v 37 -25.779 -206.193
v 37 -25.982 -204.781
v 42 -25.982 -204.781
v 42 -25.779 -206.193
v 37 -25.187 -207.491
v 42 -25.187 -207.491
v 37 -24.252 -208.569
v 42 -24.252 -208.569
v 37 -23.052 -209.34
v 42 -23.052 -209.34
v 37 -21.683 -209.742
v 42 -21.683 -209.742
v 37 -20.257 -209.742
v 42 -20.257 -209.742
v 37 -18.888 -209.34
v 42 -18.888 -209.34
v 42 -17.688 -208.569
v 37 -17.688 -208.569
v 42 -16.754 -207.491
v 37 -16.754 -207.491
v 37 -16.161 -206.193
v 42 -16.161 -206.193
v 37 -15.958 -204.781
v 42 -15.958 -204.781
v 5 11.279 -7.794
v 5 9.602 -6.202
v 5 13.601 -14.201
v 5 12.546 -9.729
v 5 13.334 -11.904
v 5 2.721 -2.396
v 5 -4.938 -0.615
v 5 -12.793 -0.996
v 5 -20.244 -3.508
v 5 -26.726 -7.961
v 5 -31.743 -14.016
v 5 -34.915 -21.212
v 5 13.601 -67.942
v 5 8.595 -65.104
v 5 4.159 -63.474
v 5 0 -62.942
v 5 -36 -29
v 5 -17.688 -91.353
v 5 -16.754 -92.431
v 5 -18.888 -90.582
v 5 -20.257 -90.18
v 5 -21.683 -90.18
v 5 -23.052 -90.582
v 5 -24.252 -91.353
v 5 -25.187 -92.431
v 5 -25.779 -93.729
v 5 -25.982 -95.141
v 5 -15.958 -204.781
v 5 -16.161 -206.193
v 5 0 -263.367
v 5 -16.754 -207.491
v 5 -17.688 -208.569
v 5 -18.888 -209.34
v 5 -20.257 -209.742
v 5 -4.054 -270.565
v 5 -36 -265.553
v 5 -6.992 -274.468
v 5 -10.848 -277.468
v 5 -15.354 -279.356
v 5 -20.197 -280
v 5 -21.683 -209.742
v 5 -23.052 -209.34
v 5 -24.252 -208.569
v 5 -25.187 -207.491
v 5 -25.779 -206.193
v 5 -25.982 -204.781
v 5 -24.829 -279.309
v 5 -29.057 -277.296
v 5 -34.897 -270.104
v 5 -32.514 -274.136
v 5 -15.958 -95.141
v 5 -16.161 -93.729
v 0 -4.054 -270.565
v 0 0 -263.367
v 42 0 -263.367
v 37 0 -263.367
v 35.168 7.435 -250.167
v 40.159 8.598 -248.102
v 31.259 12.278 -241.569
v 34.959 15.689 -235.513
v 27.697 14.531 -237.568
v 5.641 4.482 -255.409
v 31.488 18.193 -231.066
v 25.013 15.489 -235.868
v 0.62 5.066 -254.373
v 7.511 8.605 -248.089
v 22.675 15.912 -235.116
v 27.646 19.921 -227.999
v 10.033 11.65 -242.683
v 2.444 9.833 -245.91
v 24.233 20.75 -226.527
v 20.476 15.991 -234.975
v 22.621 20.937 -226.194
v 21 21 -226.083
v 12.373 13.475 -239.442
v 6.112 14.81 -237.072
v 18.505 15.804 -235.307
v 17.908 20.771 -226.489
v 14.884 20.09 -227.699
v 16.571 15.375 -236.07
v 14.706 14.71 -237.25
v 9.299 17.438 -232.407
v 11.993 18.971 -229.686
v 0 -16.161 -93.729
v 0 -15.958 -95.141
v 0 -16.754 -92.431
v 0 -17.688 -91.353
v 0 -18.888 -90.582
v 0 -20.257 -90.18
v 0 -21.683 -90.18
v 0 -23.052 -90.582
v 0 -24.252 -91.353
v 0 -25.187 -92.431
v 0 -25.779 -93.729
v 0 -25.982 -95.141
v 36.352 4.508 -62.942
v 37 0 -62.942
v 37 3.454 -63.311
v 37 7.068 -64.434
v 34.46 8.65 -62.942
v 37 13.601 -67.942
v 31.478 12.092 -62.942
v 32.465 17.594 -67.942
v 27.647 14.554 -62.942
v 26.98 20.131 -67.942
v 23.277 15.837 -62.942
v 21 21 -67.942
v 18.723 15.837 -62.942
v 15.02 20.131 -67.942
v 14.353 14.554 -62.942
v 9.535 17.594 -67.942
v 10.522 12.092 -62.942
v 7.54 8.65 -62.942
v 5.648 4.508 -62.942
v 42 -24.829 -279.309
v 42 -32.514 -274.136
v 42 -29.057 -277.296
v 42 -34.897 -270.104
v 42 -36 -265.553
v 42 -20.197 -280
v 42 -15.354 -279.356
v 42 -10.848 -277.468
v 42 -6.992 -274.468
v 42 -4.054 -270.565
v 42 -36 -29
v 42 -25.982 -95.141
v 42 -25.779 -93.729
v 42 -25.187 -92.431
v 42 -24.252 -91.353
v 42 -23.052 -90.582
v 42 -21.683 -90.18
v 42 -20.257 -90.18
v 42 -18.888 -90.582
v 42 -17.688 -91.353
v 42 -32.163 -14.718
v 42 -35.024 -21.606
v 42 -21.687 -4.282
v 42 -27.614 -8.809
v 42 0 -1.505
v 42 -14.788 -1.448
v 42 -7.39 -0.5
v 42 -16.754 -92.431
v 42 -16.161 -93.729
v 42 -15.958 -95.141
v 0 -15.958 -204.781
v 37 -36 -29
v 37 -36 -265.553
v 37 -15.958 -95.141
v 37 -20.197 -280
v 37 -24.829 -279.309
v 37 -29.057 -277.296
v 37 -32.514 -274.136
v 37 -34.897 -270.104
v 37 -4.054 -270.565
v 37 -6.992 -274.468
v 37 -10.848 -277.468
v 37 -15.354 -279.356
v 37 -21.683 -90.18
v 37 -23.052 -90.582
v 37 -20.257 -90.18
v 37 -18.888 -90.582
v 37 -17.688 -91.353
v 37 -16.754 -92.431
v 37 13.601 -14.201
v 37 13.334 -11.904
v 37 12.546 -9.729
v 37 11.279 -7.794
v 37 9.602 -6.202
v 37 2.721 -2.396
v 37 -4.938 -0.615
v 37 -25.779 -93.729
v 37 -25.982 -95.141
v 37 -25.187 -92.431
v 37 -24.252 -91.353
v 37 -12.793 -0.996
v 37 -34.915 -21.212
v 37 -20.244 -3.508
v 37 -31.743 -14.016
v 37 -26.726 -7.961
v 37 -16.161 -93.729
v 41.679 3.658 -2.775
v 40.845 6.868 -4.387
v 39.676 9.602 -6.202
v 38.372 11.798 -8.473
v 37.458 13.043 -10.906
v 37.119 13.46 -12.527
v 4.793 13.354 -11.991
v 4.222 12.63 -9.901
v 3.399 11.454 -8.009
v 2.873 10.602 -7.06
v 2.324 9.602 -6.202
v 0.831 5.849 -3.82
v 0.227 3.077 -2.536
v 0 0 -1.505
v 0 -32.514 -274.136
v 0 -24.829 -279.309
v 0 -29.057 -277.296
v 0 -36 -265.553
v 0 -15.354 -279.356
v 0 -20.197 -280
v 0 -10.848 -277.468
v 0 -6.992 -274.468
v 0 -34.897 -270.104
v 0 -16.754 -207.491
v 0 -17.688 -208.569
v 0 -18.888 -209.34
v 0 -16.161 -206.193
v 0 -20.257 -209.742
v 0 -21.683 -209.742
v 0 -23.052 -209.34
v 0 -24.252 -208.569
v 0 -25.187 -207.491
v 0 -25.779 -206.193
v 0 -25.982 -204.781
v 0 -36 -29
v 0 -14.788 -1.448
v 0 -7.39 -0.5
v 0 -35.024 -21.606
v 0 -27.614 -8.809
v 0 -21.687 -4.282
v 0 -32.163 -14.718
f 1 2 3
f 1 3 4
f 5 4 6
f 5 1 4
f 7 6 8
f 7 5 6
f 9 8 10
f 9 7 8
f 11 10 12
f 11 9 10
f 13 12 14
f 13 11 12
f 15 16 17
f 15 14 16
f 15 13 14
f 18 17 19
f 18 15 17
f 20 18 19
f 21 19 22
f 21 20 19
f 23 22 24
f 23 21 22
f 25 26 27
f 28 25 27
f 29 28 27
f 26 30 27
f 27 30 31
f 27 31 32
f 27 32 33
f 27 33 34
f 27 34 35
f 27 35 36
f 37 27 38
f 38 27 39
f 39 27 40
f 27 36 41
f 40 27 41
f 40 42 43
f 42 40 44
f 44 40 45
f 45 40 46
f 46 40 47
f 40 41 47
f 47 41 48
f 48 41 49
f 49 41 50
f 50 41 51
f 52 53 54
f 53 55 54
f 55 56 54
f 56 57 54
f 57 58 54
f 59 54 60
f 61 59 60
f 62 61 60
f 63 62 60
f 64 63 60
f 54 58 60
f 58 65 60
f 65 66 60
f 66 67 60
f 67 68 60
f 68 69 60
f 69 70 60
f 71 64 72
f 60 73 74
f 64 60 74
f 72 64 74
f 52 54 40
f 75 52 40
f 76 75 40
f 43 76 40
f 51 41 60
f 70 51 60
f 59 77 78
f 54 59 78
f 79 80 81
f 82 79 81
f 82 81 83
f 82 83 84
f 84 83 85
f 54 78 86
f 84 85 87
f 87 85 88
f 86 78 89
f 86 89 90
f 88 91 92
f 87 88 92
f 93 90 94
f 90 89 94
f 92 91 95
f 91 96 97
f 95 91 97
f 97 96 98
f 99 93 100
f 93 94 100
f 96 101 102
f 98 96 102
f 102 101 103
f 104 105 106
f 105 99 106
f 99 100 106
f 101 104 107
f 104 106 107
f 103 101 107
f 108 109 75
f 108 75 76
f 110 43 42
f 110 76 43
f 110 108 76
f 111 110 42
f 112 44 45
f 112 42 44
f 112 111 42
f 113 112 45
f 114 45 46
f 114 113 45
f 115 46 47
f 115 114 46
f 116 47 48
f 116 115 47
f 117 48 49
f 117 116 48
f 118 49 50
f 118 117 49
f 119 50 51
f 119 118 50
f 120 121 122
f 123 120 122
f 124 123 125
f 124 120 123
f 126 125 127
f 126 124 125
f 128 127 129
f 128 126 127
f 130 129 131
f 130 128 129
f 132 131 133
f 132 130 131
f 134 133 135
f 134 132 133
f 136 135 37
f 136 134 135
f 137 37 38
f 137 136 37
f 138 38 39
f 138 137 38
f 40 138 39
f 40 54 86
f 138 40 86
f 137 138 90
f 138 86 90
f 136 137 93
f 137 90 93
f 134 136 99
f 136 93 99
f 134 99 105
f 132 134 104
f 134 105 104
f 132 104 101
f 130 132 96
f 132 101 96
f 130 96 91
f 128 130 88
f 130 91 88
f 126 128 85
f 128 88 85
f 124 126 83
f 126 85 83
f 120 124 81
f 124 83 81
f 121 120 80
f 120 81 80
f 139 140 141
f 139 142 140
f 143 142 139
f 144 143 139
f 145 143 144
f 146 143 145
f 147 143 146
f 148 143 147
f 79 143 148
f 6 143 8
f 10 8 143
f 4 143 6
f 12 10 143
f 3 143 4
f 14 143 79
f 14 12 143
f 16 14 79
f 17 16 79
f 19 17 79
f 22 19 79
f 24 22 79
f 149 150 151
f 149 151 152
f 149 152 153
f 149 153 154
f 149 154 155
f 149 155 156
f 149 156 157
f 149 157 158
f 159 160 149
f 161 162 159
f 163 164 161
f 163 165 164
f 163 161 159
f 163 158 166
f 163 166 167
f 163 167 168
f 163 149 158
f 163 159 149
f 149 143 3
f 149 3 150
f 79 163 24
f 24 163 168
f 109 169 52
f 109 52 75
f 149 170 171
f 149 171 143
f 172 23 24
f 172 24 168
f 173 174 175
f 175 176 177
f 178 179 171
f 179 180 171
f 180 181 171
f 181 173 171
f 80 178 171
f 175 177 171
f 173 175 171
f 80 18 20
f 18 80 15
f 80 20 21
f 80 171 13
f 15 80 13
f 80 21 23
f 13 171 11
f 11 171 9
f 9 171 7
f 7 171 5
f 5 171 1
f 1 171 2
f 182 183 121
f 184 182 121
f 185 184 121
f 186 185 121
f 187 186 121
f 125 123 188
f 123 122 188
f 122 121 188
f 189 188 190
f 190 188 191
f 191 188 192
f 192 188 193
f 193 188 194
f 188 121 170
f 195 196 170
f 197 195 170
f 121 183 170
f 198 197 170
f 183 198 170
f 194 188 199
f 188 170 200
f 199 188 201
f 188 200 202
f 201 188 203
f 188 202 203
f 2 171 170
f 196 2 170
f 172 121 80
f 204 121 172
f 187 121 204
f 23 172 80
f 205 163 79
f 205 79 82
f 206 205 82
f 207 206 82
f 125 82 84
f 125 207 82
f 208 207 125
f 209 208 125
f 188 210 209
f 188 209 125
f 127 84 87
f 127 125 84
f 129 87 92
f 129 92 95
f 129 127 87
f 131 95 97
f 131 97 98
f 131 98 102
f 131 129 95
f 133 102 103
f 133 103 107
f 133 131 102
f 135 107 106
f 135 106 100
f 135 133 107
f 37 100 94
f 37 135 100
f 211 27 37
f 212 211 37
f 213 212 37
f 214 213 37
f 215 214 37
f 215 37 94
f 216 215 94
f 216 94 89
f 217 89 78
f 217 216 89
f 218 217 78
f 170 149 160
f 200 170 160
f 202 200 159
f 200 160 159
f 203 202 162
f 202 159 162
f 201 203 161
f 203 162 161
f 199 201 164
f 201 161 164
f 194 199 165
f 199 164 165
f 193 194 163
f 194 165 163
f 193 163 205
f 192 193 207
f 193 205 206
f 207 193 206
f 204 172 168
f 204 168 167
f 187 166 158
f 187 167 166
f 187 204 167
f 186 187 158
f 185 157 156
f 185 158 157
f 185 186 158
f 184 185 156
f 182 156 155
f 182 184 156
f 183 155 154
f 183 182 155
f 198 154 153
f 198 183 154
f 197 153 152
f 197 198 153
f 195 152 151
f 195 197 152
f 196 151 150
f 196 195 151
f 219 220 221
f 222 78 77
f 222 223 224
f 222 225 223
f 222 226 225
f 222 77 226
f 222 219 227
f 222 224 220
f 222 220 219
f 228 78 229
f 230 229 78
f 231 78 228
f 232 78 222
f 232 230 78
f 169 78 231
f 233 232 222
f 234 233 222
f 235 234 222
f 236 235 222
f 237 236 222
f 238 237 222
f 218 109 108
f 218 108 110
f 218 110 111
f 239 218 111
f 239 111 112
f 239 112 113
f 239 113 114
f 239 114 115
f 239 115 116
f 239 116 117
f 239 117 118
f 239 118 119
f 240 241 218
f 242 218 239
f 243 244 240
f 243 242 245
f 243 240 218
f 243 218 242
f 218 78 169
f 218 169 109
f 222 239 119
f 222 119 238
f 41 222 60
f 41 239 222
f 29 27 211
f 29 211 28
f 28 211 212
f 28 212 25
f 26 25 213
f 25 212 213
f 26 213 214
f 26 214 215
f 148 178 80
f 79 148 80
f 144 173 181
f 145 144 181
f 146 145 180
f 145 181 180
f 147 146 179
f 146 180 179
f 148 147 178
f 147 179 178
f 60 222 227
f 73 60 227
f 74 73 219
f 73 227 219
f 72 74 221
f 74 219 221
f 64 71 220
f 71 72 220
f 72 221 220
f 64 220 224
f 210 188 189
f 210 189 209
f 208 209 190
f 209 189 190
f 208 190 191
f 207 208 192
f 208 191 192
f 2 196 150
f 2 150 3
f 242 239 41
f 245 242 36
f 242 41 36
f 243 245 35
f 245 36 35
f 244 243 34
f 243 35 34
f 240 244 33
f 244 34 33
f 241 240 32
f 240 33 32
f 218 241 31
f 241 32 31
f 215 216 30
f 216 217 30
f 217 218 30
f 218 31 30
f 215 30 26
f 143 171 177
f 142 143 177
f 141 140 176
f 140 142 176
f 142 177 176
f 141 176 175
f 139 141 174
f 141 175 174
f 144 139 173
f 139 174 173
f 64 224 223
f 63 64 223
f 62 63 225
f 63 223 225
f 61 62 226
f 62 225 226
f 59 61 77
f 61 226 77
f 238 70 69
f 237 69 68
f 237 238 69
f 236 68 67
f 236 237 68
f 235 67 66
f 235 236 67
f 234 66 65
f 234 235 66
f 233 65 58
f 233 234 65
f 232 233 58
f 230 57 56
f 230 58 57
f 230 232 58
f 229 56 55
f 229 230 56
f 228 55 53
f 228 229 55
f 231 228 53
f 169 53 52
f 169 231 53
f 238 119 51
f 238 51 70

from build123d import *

# Parameters (mm, degrees)
WHOLEBODY_DEPTH    = 280
UPPERCURVE_DEPTH   = 286.41198293
SKETCH6_W          = 32
SKETCH6_H          = 5
CUT_EXTRUDE5_DEPTH = 285.921480537
CUT_EXTRUDE6_DEPTH = 286.411983055
UPPERHOLE_DEPTH    = 289.81308838
CHAMFER1_SIZE      = 10
CUT_EXTRUDE8_DEPTH = 286.411982957
CUT_EXTRUDE9_DEPTH = 286.411982957


with BuildPart() as part:
    # Sketch1 → WholeBody (new body)
    with BuildSketch(Plane.XY):
        with BuildLine():
            Line((0, 0), (0, -36))
            Line((0, -36), (42, -36))
            Line((42, -36), (42, 0))
            ThreePointArc((42, 0), (21, 21), (0, 0))
        make_face()
    extrude(amount=-WHOLEBODY_DEPTH)

    # Sketch2 → UpperCurve (cut, through all)
    with BuildSketch(Plane(origin=(42, 0, 0), x_dir=(0, 0, -1), z_dir=(1, 0, 0))):
        with BuildLine():
            ThreePointArc((29, -36), (0.5, -7.5), (29, 21))
            Line((29, 21), (0, 21))
            Line((0, 21), (0, 0))
            Line((0, 0), (0, -36))
            Line((0, -36), (29, -36))
        make_face()
    extrude(amount=-UPPERCURVE_DEPTH, mode=Mode.SUBTRACT)

    # Sketch6 → Cut-Extrude5 (cut, through all)
    with BuildSketch(Plane(origin=(0, 0, -280), x_dir=(-1, 0, 0), z_dir=(0, 0, -1))):
        with BuildLine():
            Line((-37, 0), (-37, -31))
            Line((-37, -31), (-5, -31))
            Line((-5, -31), (-5, 0))
            ThreePointArc((-5, 0), (-21, 16), (-37, 0))
        make_face()
        with Locations((-21, -33.5)):
            Rectangle(SKETCH6_W, SKETCH6_H)
    extrude(amount=-CUT_EXTRUDE5_DEPTH, mode=Mode.SUBTRACT)

    # Sketch8 → Cut-Extrude6 (cut, through all)
    with BuildSketch(Plane.ZY):
        Polygon((-263.367084443, 0), (-226.082527774, 21), (-280, 21), (-280, 0), align=None)
        with BuildLine():
            Line((-270.565078665, -4.054168593), (-263.367084443, 0))
            Line((-263.367084443, 0), (-280, 0))
            Line((-280, 0), (-280, -20.196793601))
            ThreePointArc((-280, -20.196793601), (-277.468291323, -10.847969039), (-270.565078665, -4.054168593))
        make_face()
        with BuildLine():
            ThreePointArc((-265.552960254, -36), (-275.843932749, -30.902613162), (-280, -20.196793601))
            Line((-280, -20.196793601), (-280, -36))
            Line((-280, -36), (-265.552960254, -36))
        make_face()
    extrude(amount=-CUT_EXTRUDE6_DEPTH, mode=Mode.SUBTRACT)

    # Sketch9 → UpperHole (cut, through all)
    with BuildSketch(Plane.XZ.offset(36)):
        Polygon((5, -0.5), (5, -57.942137899), (37, -57.942137899), (37, -29), (37, 4.098042087), (5, 4.098042087), align=None)
    extrude(amount=-UPPERHOLE_DEPTH, mode=Mode.SUBTRACT)

    # Chamfer1
    # the kernel refuses this chamfer: 10 mm, written as the material it takes off along each edge
    with BuildSketch(Plane(origin=(21, 0, -57.942137899), x_dir=(0.86749005683434, -0.49745452183446237, 0), z_dir=(-0.49745452183446237, -0.86749005683434, 0))) as chamfer1_piece_1_section:
        Polygon((21, -CHAMFER1_SIZE), (21 - CHAMFER1_SIZE, 0), (21, 0), align=None)
    chamfer1_piece_1 = revolve(axis=Axis((21, 0, -57.942137899), (0, 0, 1)), revolution_arc=239.663469858, mode=Mode.PRIVATE)
    chamfer1_piece_1 = split(chamfer1_piece_1, bisect_by=Plane(origin=(5, 16.096053983, -62.846083916), z_dir=(1, 0, 0)), keep=Keep.TOP, mode=Mode.PRIVATE)
    chamfer1_piece_1 = split(chamfer1_piece_1, bisect_by=Plane(origin=(37, 16.096053983, -62.846083916), z_dir=(-1, 0, 0)), keep=Keep.TOP, mode=Mode.PRIVATE)
    add(chamfer1_piece_1, mode=Mode.SUBTRACT)

    # Sketch11 → Cut-Extrude8 (cut, through all)
    with BuildSketch(Plane.ZY):
        with BuildLine():
            Line((-9.843331647, 13.601470509), (-14.201102996, 13.601470509))
            ThreePointArc((-14.201102996, 13.601470509), (-9.729411408, 12.545964589), (-6.20169921, 9.602265378))
            ThreePointArc((-6.20169921, 9.602265378), (-7.927428506, 11.688453055), (-9.843331647, 13.601470509))
        make_face()
    extrude(amount=-CUT_EXTRUDE8_DEPTH, mode=Mode.SUBTRACT)

    # Sketch12 → Cut-Extrude9 (cut, through all)
    with BuildSketch(Plane.ZY):
        with BuildLine():
            Line((-204.781024531, -15.957949817), (-95.140934308, -15.957949817))
            ThreePointArc((-95.140934308, -15.957949817), (-90.128815898, -20.970068227), (-95.140934308, -25.982186638))
            Line((-95.140934308, -25.982186638), (-204.781024531, -25.982186638))
            ThreePointArc((-204.781024531, -25.982186638), (-209.793142941, -20.970068227), (-204.781024531, -15.957949817))
        make_face()
    extrude(amount=-CUT_EXTRUDE9_DEPTH, mode=Mode.SUBTRACT)


solid = part.part
